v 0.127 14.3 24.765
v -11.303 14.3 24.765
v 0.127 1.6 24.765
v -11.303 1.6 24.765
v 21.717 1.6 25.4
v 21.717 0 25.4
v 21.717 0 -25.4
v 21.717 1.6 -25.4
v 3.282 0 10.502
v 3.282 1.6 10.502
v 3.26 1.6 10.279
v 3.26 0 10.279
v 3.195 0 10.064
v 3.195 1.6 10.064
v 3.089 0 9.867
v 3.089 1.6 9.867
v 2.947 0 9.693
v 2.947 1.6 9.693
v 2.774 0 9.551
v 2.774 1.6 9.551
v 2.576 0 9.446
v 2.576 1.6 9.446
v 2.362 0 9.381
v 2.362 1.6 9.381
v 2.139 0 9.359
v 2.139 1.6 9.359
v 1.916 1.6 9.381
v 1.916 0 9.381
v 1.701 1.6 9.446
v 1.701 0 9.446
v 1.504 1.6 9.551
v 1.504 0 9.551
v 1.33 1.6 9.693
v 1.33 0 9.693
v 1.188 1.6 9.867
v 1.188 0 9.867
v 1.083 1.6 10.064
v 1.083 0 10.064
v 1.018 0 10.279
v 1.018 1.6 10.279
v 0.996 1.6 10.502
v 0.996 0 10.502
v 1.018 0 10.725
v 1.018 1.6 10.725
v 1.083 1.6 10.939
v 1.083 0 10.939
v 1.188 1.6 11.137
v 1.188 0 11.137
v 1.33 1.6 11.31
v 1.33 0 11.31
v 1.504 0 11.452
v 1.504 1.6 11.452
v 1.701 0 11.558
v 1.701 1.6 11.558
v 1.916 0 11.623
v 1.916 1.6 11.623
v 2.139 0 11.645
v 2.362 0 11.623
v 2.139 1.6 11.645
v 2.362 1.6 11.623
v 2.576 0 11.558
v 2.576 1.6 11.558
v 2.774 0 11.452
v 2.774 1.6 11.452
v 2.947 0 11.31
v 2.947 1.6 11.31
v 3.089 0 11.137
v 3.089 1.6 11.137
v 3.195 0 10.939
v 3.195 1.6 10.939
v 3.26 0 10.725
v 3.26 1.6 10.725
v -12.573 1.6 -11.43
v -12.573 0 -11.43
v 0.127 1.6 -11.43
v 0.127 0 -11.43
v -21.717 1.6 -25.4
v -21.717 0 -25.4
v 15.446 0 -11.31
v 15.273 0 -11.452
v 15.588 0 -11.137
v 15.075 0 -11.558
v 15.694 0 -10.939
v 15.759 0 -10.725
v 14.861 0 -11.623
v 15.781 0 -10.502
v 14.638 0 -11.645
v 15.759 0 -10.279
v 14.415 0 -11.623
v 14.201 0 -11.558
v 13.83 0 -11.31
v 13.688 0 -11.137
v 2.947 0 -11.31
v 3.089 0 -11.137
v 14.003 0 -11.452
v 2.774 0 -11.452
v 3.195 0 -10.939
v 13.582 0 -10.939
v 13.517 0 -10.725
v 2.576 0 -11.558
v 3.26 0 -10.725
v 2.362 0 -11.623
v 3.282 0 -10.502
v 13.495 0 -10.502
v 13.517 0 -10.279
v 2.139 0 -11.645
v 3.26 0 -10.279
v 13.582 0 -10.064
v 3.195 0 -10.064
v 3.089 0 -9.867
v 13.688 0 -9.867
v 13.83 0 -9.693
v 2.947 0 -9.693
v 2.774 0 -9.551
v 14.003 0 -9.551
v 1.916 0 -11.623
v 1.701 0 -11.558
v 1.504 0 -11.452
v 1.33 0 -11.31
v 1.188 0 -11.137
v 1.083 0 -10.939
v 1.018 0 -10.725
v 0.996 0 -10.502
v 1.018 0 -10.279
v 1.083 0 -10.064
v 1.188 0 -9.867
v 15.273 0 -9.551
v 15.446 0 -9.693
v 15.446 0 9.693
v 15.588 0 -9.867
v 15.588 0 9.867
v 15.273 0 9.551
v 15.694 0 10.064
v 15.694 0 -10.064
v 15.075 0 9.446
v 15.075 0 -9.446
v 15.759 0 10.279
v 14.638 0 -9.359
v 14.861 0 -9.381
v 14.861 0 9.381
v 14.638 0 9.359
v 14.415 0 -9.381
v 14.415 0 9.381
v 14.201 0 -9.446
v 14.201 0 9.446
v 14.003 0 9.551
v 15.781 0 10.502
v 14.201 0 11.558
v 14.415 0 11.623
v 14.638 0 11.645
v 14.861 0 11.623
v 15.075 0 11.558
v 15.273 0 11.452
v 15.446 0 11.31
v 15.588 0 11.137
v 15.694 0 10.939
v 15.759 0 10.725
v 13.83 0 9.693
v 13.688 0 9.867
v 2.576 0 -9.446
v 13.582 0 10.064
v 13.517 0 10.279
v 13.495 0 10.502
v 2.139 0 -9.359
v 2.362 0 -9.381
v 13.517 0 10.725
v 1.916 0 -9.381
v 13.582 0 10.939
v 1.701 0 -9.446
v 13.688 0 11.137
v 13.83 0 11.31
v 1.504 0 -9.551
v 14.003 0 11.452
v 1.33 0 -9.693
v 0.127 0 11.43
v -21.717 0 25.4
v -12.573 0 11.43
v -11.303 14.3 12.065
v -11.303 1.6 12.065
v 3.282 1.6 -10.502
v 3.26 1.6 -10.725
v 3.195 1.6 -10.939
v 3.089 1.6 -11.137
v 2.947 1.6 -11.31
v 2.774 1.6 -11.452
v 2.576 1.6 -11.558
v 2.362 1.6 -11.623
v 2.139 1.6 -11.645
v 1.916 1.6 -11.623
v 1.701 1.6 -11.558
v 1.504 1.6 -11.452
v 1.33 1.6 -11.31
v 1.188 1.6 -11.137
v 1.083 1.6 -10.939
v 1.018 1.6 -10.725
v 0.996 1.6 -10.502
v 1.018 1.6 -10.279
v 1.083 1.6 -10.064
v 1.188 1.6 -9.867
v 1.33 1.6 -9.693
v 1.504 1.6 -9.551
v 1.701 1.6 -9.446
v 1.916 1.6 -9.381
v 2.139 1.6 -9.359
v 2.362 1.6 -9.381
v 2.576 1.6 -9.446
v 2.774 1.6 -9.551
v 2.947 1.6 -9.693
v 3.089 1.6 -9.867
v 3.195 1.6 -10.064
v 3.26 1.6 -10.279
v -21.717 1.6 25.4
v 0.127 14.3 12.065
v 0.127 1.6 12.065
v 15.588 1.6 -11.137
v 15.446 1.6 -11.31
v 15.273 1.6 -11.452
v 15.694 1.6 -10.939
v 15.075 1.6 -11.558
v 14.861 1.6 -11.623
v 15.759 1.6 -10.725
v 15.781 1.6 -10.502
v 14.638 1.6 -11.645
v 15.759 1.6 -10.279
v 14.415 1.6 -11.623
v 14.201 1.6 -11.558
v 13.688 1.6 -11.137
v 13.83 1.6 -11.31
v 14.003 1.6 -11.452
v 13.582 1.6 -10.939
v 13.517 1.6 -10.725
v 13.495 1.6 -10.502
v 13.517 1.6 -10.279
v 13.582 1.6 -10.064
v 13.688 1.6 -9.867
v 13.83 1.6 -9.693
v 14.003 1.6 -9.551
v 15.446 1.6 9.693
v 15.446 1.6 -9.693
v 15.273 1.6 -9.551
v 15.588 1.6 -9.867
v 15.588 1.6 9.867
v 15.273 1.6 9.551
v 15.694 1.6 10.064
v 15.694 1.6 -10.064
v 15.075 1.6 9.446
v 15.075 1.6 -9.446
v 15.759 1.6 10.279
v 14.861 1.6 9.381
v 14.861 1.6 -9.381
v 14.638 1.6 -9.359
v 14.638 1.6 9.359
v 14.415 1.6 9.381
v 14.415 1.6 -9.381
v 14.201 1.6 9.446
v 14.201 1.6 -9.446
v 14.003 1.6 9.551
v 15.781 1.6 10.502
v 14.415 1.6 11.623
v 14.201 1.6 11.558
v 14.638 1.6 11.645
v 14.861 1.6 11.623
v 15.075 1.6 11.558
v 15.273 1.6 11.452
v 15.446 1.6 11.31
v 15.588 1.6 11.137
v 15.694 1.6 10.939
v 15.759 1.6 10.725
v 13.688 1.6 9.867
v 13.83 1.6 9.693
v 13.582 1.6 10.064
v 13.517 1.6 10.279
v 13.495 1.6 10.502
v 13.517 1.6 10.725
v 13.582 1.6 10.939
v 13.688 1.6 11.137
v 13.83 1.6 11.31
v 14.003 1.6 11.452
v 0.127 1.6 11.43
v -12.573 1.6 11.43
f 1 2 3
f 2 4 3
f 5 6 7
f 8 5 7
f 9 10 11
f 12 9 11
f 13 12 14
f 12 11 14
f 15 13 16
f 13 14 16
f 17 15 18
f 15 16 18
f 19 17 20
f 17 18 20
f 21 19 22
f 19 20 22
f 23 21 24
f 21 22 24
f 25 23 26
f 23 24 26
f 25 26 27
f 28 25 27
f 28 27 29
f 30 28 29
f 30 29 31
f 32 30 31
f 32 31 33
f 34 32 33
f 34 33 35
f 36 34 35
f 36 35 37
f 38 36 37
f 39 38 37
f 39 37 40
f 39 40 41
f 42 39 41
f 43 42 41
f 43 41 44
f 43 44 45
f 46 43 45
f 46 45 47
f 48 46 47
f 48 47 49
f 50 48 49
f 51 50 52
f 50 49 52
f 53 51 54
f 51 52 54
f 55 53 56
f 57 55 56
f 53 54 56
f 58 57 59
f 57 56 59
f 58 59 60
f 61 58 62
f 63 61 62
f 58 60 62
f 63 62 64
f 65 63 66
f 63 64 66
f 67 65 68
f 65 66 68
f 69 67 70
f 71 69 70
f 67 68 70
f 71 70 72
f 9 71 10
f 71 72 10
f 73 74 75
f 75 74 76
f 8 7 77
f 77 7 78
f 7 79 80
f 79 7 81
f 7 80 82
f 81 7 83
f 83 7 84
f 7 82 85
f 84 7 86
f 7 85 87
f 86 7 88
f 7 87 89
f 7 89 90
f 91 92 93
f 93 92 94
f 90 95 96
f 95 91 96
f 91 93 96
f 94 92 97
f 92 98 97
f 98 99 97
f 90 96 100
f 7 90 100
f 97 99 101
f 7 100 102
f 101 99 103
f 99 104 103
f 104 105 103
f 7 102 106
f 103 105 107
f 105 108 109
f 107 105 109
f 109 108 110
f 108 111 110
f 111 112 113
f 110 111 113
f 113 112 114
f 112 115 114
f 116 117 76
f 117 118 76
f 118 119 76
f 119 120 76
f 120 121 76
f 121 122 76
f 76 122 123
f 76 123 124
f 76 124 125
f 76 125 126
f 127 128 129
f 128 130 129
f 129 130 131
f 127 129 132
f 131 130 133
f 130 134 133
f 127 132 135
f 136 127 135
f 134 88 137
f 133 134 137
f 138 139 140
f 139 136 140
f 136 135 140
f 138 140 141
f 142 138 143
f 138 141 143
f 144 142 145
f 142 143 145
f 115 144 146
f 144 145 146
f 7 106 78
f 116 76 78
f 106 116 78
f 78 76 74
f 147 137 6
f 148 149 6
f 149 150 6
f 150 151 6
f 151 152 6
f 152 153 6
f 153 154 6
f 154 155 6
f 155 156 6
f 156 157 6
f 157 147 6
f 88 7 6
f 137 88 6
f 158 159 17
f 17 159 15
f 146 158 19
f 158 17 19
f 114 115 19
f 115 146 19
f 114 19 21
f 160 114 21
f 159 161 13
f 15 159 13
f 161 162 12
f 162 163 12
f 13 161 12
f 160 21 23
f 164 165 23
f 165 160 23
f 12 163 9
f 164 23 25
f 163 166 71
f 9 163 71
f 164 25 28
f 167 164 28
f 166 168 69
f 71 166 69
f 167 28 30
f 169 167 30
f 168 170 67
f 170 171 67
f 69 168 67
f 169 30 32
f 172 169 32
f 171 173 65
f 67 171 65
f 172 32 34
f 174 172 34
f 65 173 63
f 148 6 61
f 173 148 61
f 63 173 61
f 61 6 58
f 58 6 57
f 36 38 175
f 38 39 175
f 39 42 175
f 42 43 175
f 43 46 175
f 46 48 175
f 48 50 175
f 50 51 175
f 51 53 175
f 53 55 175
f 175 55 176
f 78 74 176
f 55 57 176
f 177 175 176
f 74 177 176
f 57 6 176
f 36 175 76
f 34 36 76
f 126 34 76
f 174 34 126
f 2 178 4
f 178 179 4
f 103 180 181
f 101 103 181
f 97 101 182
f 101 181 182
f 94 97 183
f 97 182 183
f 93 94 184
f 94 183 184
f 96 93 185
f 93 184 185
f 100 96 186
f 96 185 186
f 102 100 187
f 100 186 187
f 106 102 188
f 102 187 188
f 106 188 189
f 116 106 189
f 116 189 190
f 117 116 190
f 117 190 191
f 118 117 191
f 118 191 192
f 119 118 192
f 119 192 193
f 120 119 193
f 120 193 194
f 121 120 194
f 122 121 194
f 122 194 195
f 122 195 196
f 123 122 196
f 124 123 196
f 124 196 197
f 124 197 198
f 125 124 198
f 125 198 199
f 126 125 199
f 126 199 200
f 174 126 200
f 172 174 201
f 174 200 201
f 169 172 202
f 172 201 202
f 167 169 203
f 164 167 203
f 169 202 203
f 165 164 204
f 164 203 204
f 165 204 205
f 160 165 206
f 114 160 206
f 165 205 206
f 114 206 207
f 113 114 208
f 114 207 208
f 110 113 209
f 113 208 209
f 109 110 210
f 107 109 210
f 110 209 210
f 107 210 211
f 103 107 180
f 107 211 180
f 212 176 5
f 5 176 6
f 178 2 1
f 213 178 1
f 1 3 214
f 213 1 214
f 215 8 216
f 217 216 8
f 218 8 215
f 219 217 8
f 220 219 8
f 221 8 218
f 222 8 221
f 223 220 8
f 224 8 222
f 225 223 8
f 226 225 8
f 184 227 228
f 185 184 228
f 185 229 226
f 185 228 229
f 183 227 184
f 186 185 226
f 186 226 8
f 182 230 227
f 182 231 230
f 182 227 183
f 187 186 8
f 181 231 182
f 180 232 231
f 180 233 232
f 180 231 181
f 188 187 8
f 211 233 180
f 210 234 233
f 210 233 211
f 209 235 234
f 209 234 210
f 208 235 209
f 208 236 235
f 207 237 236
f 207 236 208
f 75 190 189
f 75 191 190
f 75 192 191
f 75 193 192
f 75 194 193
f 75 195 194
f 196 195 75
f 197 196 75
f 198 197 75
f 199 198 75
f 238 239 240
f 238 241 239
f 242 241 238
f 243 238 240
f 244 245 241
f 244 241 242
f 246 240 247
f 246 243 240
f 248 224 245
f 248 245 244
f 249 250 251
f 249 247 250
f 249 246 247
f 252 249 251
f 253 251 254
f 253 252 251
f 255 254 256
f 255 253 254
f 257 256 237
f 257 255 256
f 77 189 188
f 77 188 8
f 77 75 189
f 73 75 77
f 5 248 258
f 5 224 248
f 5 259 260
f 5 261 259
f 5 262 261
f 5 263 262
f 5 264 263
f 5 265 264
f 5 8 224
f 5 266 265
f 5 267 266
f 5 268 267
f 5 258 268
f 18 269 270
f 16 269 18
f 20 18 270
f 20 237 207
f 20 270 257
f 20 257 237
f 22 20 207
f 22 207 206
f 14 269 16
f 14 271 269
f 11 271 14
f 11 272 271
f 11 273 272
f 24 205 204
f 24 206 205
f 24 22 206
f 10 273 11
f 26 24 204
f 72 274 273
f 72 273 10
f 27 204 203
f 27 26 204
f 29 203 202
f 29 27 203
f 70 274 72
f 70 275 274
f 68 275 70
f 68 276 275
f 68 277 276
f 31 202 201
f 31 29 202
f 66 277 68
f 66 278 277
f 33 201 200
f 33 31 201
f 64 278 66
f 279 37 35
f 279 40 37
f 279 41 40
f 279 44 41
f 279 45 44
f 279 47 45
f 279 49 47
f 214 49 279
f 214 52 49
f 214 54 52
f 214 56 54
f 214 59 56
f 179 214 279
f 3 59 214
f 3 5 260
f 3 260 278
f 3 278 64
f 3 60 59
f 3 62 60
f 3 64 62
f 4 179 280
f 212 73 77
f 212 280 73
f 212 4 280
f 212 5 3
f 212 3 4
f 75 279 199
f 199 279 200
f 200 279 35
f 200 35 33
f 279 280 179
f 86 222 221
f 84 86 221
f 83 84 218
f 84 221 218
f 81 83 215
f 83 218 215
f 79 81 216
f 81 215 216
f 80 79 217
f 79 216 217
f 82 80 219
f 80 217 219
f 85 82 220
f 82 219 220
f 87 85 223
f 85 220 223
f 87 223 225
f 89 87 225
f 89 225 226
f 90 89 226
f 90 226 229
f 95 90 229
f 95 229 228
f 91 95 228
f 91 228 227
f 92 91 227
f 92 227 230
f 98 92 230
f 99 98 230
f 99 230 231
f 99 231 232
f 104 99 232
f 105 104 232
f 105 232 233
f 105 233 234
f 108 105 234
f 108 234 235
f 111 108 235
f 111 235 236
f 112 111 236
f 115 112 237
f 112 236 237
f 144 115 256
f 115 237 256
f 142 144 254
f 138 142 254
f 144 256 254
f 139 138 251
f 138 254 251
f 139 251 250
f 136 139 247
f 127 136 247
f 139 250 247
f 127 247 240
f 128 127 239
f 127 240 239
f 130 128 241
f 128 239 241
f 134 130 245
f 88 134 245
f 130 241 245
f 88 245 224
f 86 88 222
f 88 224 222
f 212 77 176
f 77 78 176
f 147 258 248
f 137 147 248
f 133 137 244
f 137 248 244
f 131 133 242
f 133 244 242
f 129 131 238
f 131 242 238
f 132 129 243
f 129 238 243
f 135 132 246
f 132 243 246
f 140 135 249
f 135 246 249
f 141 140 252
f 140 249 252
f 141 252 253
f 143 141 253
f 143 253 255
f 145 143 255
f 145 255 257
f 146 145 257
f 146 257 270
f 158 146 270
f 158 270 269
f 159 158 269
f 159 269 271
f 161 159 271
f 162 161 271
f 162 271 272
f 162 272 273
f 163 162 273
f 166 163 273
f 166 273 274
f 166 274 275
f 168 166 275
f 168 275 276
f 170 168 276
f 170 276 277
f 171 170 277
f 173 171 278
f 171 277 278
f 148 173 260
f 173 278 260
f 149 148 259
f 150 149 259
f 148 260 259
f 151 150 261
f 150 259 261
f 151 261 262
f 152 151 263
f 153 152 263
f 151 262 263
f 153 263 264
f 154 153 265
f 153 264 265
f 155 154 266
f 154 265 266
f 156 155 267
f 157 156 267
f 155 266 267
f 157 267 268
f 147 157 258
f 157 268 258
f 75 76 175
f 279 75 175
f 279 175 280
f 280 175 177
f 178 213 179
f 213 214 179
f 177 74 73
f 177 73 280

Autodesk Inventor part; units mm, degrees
ref_plane "YZ Plane" through (0, 0, 0) normal (1, 0, 0) x (0, 1, 0)
sketch "Sketch1" plane through (0, 0, 0) normal (0, 1, 0) x (-1, 0, 0)
  line L0 (21.717, 25.4) -> (-21.717, 25.4)
  line L1 (-21.717, 25.4) -> (-21.717, -25.4)
  line L2 (-21.717, -25.4) -> (21.717, -25.4)
  line L3 (21.717, -25.4) -> (21.717, -11.43)
  line L4 (12.573, -11.43) -> (-0.127, -11.43)
  line L5 (-0.127, -11.43) -> (-0.127, 11.43)
  line L6 (-0.127, 11.43) -> (12.573, 11.43)
  line L7 (21.717, 11.43) -> (21.717, 25.4)
  line L8 (12.573, -11.43) -> (12.573, 11.43)
  line L9 (21.717, 11.43) -> (21.717, -11.43)
  point P0 (0, 0)
  dimension "d0" = 43.434
  dimension "d1" = 43.434
  dimension "d2" = 21.717
  dimension "d3" = 50.8
  dimension "d4" = 25.4
  dimension "d33" = 21.59
  dimension "d34" = 12.7
  dimension "d35" = 13.97
  dimension "d36" = 13.97
ref_plane "Work Plane2" through (0, 1.6, 0) normal (0, 1, 0) x (1, 0, 0)
extrude "Extrusion4" add sketch "Sketch1" along normal blind 1.6
ref_plane "Work Plane1" through (0, 1.6, 0) normal (0, 1, 0) x (1, 0, 0)
sketch "Sketch3" plane through (0, 1.6, 0) normal (0, 1, 0) x (1, 0, 0)
  circle A0 centre (2.1387, -10.5016) radius 1.143
  circle A1 centre (2.1387, 10.5016) radius 1.143
  circle A2 centre (14.638, -10.5016) radius 1.143
  circle A3 centre (14.638, 10.5016) radius 1.143
  line L0 (21.717, -25.4) -> (21.717, 25.4) projected
  point P0 (0, 0)
  dimension "d19" = 2.286
  dimension "d20" = 2.286
  dimension "d21" = 2.286
  dimension "d22" = 2.286
  dimension "d23" = 21.0033
  dimension "d24" = 21.0033
  dimension "d27" = 12.4993
  dimension "d30" = 12.4993
  dimension "d42" = 7.079
  dimension "d43" = 7.079
  dimension "d44" = 10.5016
extrude "Extrusion6" cut sketch "Sketch3" against normal through all
sketch "Sketch4" plane through (0, 1.6, 0) normal (0, 1, 0) x (1, 0, 0)
  line L0 (-11.303, -24.765) -> (0.127, -24.765)
  line L1 (0.127, -24.765) -> (0.127, -12.065)
  line L2 (0.127, -12.065) -> (-11.303, -12.065)
  line L3 (-11.303, -12.065) -> (-11.303, -24.765)
  line L4 (-12.573, -11.43) -> (-12.573, 11.43) projected
  line L5 (0.127, 11.43) -> (0.127, -11.43) projected
  line L6 (-21.717, -25.4) -> (21.717, -25.4) projected
  point P0 (0, 0)
  dimension "d48" = 0
  dimension "d49" = 11.43
  dimension "d50" = 12.7
  dimension "d51" = 0.635
extrude "Extrusion7" add sketch "Sketch4" along normal blind 12.7
equation "\"d1\" = d0"
equation "\"d2\" = 0.5 * d0"
equation "\"d4\" = 0.5 * d3"
equation "\"d36\" = d35"
equation "\"d20\" = d19"
equation "\"d21\" = d20"
equation "\"d22\" = d21"
equation "\"d24\" = d23"
equation "\"d30\" = d27"
equation "\"d43\" = d42"
equation "\"d44\" = 0.5 * d24"
properties part number "Sensor Board"
